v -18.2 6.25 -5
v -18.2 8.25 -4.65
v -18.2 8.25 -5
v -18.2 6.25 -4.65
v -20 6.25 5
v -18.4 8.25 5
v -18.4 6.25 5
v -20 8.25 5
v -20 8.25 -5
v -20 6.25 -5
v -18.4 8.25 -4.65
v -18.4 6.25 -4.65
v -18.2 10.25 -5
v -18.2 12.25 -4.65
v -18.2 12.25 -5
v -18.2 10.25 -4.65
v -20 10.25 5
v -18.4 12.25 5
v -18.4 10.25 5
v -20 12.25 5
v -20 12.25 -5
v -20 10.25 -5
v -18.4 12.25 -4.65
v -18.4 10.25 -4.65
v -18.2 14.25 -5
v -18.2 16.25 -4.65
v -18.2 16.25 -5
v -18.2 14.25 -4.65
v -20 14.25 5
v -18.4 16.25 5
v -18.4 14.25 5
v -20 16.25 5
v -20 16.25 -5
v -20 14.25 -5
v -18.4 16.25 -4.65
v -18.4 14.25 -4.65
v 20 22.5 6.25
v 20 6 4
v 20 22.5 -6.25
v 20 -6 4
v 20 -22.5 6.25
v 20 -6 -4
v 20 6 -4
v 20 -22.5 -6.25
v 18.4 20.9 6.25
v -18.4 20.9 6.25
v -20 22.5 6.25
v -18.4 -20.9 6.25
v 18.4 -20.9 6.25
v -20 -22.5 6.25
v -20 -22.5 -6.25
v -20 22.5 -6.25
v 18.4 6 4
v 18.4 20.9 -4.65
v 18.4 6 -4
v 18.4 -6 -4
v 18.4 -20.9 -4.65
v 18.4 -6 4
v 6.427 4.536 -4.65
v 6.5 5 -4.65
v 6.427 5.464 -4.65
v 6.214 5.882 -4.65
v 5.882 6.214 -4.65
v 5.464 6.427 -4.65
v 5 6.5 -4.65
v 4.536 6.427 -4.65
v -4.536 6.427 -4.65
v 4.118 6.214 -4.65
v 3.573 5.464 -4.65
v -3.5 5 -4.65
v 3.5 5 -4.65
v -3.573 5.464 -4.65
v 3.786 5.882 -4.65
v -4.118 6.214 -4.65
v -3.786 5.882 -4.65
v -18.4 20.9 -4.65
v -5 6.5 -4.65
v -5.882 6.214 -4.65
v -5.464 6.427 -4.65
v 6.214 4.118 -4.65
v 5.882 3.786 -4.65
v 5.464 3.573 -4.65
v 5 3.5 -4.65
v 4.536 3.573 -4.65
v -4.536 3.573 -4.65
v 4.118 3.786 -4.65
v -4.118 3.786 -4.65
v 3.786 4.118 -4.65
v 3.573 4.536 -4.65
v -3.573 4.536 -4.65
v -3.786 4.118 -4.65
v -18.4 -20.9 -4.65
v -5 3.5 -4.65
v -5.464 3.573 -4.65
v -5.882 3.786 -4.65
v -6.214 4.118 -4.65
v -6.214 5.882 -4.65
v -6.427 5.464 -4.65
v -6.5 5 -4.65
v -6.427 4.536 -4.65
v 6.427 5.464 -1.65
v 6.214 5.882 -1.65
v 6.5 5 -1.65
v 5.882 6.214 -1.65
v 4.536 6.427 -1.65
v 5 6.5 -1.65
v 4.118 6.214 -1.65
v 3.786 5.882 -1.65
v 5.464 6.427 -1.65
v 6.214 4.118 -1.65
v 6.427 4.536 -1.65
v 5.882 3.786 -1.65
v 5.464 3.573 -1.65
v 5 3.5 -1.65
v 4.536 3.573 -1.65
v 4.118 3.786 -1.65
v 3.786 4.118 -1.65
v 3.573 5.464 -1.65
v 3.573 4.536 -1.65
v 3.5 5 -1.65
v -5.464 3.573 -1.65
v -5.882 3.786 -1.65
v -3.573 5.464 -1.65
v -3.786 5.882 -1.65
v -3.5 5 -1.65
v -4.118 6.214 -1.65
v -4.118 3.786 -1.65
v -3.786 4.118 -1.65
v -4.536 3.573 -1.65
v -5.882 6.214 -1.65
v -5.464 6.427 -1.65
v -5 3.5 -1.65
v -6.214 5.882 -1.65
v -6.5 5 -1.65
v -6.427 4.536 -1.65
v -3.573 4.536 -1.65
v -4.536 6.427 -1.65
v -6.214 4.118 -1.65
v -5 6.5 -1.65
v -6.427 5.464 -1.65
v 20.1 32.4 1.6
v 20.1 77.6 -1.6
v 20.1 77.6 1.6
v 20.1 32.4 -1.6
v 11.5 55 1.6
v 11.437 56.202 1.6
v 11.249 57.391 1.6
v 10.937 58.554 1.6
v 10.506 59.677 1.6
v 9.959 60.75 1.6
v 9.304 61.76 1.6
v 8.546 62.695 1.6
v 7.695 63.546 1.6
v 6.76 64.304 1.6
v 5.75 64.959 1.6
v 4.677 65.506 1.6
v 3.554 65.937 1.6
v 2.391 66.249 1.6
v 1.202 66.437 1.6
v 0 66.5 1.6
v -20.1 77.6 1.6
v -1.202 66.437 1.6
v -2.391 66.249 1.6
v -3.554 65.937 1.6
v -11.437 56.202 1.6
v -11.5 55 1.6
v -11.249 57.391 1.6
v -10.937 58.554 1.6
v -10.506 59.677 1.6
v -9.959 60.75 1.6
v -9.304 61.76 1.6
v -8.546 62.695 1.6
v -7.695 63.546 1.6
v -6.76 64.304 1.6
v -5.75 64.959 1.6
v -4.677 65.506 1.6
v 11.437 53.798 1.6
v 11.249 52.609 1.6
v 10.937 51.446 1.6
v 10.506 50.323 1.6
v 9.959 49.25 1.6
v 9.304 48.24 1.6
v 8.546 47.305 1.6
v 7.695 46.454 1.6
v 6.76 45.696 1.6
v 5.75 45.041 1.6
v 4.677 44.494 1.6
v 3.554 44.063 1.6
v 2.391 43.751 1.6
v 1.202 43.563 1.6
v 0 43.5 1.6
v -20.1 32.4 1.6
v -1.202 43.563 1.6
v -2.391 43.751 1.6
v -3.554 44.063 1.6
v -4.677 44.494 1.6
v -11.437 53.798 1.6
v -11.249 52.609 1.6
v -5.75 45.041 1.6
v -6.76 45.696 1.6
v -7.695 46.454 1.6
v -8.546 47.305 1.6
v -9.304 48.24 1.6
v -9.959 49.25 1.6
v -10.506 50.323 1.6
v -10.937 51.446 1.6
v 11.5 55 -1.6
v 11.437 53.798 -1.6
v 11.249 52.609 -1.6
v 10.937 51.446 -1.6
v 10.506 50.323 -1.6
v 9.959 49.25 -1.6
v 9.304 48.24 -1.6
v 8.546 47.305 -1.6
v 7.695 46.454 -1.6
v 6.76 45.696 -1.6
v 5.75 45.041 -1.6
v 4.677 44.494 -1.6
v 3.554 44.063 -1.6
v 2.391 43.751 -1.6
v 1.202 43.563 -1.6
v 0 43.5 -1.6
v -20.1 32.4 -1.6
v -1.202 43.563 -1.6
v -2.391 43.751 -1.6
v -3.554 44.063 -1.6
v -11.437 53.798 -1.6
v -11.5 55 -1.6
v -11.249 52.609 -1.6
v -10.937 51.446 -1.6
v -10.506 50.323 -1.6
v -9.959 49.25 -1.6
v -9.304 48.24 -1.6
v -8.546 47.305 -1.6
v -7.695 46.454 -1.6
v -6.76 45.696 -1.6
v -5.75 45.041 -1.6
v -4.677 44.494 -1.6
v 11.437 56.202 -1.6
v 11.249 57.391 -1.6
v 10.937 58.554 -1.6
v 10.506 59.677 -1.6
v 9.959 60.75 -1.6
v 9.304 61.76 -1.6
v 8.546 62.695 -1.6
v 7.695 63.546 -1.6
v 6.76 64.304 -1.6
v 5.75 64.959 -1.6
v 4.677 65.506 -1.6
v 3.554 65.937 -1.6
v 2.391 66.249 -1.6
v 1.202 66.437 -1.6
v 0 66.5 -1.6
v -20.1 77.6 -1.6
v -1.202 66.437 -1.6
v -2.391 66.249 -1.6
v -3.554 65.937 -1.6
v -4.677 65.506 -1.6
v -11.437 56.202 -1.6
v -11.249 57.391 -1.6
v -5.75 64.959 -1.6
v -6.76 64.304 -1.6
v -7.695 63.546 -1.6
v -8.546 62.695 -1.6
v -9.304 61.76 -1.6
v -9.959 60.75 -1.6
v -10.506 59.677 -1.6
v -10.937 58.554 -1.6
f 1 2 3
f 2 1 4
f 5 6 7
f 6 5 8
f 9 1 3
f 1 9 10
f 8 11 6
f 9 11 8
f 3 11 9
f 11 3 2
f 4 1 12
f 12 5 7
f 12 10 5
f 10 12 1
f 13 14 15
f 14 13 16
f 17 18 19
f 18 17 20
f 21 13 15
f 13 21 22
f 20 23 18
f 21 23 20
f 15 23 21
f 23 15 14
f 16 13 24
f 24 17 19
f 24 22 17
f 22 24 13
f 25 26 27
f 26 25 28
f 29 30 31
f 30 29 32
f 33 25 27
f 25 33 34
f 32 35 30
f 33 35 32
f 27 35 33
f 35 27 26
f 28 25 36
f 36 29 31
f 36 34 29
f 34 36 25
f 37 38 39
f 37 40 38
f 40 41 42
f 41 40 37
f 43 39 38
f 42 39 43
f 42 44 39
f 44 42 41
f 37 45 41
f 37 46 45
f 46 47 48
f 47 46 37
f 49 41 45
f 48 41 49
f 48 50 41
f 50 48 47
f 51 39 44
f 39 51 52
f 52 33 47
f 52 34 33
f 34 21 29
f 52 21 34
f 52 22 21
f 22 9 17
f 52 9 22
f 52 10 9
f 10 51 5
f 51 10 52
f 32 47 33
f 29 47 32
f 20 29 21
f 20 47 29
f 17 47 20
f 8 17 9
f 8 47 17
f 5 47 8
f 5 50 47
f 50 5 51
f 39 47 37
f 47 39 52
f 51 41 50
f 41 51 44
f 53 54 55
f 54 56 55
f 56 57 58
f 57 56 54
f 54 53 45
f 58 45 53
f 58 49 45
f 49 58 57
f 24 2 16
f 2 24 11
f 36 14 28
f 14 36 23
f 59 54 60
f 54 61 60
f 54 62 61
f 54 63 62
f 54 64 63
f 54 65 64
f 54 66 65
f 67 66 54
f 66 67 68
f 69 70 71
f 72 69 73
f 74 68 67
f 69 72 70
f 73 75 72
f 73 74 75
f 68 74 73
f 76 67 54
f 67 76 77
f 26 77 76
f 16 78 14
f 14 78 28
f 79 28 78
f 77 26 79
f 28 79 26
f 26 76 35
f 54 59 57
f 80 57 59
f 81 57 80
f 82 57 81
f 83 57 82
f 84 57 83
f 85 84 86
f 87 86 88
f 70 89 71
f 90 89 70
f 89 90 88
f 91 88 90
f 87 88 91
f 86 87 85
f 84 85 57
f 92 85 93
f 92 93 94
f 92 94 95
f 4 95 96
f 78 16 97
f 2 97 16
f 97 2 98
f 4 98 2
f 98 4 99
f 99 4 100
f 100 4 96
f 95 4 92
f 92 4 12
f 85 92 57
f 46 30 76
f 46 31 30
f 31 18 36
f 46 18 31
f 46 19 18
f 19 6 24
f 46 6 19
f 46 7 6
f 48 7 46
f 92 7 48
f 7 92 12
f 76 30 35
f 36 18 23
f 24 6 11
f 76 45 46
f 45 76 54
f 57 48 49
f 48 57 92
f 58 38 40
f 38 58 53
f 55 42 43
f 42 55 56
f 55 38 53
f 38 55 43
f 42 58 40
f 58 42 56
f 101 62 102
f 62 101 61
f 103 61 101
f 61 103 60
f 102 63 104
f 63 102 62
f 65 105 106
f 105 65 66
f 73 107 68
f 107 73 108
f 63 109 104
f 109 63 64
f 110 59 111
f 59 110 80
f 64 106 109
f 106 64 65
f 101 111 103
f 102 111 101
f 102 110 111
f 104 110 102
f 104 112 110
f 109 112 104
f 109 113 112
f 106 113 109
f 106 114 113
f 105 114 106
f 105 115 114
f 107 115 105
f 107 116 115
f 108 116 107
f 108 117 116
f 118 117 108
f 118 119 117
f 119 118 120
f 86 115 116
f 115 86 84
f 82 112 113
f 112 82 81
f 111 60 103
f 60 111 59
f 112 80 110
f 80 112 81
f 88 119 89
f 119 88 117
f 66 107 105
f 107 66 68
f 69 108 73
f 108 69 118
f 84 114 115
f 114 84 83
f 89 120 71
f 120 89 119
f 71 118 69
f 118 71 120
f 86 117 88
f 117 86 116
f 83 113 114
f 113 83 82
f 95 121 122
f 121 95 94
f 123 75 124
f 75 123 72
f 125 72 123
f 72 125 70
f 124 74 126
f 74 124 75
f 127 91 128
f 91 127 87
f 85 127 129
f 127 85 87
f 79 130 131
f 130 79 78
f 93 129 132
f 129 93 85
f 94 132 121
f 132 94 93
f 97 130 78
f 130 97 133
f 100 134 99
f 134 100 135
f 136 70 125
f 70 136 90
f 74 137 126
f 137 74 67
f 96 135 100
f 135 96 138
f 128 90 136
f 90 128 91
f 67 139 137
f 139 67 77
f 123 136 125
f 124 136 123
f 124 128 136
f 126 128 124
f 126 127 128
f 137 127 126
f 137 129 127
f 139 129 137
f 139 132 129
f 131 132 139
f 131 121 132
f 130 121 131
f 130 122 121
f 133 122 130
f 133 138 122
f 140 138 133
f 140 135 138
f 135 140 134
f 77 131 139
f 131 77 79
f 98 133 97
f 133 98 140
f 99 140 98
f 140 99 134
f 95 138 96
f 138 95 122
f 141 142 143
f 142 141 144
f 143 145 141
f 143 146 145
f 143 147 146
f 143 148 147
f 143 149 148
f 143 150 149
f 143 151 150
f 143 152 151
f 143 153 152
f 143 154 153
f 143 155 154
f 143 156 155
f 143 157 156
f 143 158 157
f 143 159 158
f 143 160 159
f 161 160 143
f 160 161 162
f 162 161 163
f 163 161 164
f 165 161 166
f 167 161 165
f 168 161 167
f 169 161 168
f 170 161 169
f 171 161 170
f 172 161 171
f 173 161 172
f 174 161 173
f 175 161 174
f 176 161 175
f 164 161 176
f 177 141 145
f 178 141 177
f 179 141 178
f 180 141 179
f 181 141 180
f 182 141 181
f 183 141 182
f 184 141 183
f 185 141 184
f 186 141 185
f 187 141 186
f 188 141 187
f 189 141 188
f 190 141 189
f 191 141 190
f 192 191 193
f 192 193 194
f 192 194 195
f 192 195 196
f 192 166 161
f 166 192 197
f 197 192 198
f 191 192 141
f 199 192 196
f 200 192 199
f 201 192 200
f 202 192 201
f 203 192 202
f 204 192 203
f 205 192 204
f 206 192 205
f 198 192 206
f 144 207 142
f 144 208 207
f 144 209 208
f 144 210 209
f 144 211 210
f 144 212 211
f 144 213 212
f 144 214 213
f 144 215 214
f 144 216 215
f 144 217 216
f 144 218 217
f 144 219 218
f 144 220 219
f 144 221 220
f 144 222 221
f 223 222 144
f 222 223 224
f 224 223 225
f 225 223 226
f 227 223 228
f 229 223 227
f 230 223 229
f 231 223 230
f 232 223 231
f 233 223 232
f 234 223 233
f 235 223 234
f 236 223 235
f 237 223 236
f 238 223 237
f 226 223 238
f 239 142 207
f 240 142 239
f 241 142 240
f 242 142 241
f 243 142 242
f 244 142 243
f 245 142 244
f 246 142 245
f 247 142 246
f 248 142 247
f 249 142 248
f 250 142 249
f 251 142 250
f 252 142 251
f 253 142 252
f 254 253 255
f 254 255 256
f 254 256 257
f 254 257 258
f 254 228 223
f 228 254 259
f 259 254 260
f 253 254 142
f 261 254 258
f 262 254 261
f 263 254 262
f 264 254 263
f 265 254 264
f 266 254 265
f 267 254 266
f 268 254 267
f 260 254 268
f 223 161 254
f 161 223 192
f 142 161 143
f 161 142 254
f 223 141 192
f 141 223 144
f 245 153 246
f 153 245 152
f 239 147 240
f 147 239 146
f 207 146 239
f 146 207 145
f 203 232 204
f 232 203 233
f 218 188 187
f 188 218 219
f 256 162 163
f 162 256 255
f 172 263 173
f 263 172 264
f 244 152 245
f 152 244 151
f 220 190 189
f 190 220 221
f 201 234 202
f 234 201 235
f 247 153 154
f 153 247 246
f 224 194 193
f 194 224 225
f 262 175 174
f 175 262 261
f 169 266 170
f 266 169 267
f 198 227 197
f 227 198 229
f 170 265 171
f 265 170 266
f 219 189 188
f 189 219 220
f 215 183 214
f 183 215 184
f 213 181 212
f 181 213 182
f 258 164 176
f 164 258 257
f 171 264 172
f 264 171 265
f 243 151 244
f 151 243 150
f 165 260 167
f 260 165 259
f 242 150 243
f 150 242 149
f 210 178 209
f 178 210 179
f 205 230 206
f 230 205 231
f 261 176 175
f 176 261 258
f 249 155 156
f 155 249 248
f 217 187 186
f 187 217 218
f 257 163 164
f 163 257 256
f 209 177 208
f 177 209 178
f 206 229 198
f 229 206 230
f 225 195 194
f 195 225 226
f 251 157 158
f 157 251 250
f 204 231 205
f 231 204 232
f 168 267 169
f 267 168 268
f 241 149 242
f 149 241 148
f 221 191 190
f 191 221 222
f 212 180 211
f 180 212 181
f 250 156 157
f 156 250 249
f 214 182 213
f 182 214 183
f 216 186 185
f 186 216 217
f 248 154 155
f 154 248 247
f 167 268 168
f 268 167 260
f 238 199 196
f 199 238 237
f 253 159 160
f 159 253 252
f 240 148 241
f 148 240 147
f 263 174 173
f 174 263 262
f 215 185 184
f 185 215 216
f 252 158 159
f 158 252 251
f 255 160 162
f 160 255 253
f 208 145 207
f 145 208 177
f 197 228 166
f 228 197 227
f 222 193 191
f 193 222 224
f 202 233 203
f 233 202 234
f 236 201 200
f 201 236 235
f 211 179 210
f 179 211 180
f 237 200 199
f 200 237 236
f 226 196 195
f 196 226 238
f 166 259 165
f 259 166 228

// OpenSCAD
// --- PARÁMETROS EDITABLES (Cámbialos aquí) ---
ancho_total = 40;
largo_total = 45;
alto_total = 25;
grosor_pared = 1.6;
tolerancia = 0.2; // Espacio extra para que las piezas encajen

// --- COMPONENTES ---
// 1. Base de la caja
module base() {
    difference() {
        // Cuerpo exterior
        cube([ancho_total, largo_total, alto_total/2], center=true);
        // Vaciado interior
        translate([0,0,grosor_pared])
            cube([ancho_total-grosor_pared*2, largo_total-grosor_pared*2, alto_total/2], center=true);
        
        // Hueco para USB-C del Super Mini
        translate([ancho_total/2, 0, 0])
            cube([grosor_pared+2, 12, 8], center=true);
            
        // Rejillas de ventilación para el BMP180
        for(i = [-1:1]) {
            translate([-ancho_total/2, (largo_total/4) + i*4, 0])
                cube([grosor_pared+2, 2, 10], center=true);
        }
    }
    
    // Soportes internos (Standoffs) para el ESP32
    translate([5, 5, -alto_total/4 + grosor_pared])
        cylinder(h=3, d=3, $fn=20);
    translate([-5, 5, -alto_total/4 + grosor_pared])
        cylinder(h=3, d=3, $fn=20);
}

// 2. Tapa con hueco para PIR
module tapa() {
    translate([0, largo_total + 10, 0]) // Desplazada para verla en el preview
    difference() {
        // Estructura de la tapa
        cube([ancho_total + tolerancia, largo_total + tolerancia, grosor_pared*2], center=true);
        
        // HUECO CIRCULAR PARA EL PIR (Ajusta el radio según tu sensor)
        cylinder(h=grosor_pared*4, r=11.5, center=true, $fn=60); 
    }
}

// Renderizar ambos
base();
tapa();
